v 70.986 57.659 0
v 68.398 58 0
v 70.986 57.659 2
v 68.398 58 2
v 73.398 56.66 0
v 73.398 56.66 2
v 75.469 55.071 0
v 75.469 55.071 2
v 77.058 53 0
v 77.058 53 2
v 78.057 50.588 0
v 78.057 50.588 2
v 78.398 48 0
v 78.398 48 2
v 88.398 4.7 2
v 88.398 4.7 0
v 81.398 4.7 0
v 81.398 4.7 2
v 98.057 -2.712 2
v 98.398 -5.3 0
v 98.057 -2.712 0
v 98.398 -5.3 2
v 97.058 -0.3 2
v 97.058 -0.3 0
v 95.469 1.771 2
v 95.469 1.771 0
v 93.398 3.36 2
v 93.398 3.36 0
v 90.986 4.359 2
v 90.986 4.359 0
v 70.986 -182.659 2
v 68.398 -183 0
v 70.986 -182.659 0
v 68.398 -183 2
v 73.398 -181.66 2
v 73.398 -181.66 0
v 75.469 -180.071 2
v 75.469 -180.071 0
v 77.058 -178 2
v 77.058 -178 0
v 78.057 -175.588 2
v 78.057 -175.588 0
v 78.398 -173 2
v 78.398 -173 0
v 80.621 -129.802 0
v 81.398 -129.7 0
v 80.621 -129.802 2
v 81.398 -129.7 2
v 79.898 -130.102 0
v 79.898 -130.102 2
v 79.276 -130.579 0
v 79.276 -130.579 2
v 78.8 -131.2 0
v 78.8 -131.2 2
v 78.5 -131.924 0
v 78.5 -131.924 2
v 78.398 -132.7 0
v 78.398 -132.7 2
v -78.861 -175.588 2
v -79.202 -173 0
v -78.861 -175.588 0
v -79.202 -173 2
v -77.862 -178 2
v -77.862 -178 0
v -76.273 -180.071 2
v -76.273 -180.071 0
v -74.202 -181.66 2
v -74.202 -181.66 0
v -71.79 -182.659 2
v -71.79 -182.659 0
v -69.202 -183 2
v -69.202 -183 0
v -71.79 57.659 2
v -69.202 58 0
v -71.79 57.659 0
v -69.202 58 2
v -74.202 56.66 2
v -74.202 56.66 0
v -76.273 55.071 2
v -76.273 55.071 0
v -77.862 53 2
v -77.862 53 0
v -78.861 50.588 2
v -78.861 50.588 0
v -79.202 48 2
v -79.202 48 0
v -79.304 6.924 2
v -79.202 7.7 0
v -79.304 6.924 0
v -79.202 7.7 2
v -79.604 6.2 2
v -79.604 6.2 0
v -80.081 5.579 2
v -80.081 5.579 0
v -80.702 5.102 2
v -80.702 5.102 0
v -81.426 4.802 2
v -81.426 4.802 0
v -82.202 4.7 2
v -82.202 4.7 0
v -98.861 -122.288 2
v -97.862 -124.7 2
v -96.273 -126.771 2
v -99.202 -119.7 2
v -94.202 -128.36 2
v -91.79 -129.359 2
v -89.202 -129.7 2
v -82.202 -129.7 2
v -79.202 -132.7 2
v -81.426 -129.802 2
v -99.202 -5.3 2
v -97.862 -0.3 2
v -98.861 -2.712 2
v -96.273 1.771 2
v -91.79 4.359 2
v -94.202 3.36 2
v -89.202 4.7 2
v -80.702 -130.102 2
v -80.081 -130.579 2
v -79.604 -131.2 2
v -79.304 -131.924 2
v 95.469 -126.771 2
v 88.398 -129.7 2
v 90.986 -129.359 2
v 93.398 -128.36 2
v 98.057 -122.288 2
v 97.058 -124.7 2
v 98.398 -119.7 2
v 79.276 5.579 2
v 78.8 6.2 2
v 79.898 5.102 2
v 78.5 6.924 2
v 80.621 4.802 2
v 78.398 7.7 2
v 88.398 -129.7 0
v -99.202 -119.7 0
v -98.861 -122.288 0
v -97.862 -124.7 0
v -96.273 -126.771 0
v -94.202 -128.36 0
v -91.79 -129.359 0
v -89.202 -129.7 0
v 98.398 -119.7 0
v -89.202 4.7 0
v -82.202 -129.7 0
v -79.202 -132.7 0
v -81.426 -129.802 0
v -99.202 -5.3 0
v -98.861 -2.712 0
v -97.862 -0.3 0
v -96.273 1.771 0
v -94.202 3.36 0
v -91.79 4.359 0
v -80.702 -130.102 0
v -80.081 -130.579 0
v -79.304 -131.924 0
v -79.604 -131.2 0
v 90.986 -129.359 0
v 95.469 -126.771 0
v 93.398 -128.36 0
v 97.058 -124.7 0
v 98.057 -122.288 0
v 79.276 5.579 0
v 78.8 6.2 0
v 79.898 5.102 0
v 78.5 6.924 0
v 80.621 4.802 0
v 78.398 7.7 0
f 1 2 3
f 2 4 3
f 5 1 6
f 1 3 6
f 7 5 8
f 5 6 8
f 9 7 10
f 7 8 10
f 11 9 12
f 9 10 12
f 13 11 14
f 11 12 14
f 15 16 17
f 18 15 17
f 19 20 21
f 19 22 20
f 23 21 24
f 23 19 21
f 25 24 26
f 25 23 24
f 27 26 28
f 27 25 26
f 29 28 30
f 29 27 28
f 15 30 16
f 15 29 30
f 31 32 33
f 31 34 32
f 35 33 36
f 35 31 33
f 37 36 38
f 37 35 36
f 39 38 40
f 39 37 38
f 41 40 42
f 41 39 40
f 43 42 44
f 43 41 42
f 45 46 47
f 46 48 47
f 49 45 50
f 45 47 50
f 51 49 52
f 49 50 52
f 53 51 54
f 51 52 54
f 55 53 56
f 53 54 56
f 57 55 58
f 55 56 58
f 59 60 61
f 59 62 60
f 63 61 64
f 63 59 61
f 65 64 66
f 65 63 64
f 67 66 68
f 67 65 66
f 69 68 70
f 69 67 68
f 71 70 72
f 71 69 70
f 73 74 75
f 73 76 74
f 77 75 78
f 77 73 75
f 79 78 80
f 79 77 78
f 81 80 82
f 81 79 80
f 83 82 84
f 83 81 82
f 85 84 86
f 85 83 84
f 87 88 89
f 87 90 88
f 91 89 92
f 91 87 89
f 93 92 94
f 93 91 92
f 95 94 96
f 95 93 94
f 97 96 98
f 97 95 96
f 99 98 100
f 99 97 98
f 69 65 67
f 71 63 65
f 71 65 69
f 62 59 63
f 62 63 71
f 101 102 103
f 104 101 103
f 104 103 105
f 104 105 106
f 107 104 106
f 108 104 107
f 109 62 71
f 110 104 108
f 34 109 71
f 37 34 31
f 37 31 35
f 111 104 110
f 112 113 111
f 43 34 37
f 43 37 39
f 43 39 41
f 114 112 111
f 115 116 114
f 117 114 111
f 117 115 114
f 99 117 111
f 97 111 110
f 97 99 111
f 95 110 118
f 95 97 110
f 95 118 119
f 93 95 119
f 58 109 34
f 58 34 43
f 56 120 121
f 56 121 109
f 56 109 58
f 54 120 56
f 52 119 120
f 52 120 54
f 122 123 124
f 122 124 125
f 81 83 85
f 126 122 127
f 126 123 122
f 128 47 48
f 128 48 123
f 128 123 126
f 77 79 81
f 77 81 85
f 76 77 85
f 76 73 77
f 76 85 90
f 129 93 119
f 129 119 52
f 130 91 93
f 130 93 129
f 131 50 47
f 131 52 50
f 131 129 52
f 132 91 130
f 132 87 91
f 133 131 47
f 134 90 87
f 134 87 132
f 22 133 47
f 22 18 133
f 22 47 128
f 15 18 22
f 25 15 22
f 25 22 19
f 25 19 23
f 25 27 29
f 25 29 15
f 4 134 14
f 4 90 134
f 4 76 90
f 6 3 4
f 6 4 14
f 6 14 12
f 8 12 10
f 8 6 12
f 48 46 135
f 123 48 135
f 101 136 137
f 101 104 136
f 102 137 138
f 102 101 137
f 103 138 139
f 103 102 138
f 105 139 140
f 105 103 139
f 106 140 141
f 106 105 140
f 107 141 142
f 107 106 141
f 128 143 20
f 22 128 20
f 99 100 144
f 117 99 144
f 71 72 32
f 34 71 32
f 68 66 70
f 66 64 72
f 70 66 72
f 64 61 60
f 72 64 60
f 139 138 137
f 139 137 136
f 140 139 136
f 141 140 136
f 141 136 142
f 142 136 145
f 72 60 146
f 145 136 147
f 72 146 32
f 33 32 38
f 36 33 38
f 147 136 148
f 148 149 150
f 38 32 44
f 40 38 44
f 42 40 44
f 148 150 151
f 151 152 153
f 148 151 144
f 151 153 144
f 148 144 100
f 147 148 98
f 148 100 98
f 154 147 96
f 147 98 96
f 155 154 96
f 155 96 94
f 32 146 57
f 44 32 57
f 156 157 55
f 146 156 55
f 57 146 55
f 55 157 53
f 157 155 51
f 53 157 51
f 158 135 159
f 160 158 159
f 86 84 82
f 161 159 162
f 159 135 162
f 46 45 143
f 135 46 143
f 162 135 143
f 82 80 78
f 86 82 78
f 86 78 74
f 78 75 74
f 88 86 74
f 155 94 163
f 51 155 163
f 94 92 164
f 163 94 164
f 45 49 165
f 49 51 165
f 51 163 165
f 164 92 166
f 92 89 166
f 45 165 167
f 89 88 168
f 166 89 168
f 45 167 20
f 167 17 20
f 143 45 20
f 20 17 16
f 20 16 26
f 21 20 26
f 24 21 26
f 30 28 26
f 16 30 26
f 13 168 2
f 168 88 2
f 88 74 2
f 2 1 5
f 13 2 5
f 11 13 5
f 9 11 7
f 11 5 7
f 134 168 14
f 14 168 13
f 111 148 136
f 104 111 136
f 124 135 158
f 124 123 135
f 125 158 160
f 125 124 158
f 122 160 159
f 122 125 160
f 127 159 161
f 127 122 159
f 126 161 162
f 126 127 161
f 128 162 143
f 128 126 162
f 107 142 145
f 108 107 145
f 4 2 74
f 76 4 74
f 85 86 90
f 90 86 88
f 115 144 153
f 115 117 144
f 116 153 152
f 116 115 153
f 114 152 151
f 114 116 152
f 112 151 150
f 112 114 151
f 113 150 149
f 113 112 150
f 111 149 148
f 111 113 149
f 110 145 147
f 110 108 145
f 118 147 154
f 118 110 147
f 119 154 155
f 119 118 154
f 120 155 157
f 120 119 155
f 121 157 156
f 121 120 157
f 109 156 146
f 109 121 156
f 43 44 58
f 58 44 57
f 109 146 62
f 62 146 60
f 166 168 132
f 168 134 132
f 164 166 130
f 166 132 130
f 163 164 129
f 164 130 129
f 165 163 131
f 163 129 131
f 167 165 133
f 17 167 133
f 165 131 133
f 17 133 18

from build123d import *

# Parameters (mm, degrees)
Y_KSEKLIK_EKSTR_ZYON1_DEPTH = 2
RADYUS1_R                   = 10
RADYUS2_R                   = 3


with BuildPart() as part:
    # Çizim1 → Yükseklik-Ekstrüzyon1 (new body)
    with BuildSketch(Plane.XY):
        Polygon((78.397764574, 53), (78.397764574, 58), (-79.202235426, 58), (-79.202235426, 53), (-79.202235426, 4.7), (-99.202235426, 4.7), (-99.202235426, -129.7), (-79.202235426, -129.7), (-79.202235426, -178), (-79.202235426, -183), (78.397764574, -183), (78.397764574, -178), (78.397764574, -129.7), (98.397764574, -129.7), (98.397764574, 4.7), (78.397764574, 4.7), align=None)
    extrude(amount=Y_KSEKLIK_EKSTR_ZYON1_DEPTH)

    # Radyus1
    radyus1_edges = [part.edges().sort_by_distance(p)[0] for p in [
        (-79.202235426, 58, 1),
        (78.397764574, 58, 1),
        (98.397764574, 4.7, 1),
        (98.397764574, -129.7, 1),
        (78.397764574, -183, 1),
        (-79.202235426, -183, 1),
        (-99.202235426, -129.7, 1),
        (-99.202235426, 4.7, 1),
    ]]
    fillet(radyus1_edges, radius=RADYUS1_R)

    # Radyus2
    radyus2_edges = [part.edges().sort_by_distance(p)[0] for p in [
        (78.397764574, 4.7, 1),
        (78.397764574, -129.7, 1),
        (-79.202235426, -129.7, 1),
        (-79.202235426, 4.7, 1),
    ]]
    fillet(radyus2_edges, radius=RADYUS2_R)


solid = part.part
